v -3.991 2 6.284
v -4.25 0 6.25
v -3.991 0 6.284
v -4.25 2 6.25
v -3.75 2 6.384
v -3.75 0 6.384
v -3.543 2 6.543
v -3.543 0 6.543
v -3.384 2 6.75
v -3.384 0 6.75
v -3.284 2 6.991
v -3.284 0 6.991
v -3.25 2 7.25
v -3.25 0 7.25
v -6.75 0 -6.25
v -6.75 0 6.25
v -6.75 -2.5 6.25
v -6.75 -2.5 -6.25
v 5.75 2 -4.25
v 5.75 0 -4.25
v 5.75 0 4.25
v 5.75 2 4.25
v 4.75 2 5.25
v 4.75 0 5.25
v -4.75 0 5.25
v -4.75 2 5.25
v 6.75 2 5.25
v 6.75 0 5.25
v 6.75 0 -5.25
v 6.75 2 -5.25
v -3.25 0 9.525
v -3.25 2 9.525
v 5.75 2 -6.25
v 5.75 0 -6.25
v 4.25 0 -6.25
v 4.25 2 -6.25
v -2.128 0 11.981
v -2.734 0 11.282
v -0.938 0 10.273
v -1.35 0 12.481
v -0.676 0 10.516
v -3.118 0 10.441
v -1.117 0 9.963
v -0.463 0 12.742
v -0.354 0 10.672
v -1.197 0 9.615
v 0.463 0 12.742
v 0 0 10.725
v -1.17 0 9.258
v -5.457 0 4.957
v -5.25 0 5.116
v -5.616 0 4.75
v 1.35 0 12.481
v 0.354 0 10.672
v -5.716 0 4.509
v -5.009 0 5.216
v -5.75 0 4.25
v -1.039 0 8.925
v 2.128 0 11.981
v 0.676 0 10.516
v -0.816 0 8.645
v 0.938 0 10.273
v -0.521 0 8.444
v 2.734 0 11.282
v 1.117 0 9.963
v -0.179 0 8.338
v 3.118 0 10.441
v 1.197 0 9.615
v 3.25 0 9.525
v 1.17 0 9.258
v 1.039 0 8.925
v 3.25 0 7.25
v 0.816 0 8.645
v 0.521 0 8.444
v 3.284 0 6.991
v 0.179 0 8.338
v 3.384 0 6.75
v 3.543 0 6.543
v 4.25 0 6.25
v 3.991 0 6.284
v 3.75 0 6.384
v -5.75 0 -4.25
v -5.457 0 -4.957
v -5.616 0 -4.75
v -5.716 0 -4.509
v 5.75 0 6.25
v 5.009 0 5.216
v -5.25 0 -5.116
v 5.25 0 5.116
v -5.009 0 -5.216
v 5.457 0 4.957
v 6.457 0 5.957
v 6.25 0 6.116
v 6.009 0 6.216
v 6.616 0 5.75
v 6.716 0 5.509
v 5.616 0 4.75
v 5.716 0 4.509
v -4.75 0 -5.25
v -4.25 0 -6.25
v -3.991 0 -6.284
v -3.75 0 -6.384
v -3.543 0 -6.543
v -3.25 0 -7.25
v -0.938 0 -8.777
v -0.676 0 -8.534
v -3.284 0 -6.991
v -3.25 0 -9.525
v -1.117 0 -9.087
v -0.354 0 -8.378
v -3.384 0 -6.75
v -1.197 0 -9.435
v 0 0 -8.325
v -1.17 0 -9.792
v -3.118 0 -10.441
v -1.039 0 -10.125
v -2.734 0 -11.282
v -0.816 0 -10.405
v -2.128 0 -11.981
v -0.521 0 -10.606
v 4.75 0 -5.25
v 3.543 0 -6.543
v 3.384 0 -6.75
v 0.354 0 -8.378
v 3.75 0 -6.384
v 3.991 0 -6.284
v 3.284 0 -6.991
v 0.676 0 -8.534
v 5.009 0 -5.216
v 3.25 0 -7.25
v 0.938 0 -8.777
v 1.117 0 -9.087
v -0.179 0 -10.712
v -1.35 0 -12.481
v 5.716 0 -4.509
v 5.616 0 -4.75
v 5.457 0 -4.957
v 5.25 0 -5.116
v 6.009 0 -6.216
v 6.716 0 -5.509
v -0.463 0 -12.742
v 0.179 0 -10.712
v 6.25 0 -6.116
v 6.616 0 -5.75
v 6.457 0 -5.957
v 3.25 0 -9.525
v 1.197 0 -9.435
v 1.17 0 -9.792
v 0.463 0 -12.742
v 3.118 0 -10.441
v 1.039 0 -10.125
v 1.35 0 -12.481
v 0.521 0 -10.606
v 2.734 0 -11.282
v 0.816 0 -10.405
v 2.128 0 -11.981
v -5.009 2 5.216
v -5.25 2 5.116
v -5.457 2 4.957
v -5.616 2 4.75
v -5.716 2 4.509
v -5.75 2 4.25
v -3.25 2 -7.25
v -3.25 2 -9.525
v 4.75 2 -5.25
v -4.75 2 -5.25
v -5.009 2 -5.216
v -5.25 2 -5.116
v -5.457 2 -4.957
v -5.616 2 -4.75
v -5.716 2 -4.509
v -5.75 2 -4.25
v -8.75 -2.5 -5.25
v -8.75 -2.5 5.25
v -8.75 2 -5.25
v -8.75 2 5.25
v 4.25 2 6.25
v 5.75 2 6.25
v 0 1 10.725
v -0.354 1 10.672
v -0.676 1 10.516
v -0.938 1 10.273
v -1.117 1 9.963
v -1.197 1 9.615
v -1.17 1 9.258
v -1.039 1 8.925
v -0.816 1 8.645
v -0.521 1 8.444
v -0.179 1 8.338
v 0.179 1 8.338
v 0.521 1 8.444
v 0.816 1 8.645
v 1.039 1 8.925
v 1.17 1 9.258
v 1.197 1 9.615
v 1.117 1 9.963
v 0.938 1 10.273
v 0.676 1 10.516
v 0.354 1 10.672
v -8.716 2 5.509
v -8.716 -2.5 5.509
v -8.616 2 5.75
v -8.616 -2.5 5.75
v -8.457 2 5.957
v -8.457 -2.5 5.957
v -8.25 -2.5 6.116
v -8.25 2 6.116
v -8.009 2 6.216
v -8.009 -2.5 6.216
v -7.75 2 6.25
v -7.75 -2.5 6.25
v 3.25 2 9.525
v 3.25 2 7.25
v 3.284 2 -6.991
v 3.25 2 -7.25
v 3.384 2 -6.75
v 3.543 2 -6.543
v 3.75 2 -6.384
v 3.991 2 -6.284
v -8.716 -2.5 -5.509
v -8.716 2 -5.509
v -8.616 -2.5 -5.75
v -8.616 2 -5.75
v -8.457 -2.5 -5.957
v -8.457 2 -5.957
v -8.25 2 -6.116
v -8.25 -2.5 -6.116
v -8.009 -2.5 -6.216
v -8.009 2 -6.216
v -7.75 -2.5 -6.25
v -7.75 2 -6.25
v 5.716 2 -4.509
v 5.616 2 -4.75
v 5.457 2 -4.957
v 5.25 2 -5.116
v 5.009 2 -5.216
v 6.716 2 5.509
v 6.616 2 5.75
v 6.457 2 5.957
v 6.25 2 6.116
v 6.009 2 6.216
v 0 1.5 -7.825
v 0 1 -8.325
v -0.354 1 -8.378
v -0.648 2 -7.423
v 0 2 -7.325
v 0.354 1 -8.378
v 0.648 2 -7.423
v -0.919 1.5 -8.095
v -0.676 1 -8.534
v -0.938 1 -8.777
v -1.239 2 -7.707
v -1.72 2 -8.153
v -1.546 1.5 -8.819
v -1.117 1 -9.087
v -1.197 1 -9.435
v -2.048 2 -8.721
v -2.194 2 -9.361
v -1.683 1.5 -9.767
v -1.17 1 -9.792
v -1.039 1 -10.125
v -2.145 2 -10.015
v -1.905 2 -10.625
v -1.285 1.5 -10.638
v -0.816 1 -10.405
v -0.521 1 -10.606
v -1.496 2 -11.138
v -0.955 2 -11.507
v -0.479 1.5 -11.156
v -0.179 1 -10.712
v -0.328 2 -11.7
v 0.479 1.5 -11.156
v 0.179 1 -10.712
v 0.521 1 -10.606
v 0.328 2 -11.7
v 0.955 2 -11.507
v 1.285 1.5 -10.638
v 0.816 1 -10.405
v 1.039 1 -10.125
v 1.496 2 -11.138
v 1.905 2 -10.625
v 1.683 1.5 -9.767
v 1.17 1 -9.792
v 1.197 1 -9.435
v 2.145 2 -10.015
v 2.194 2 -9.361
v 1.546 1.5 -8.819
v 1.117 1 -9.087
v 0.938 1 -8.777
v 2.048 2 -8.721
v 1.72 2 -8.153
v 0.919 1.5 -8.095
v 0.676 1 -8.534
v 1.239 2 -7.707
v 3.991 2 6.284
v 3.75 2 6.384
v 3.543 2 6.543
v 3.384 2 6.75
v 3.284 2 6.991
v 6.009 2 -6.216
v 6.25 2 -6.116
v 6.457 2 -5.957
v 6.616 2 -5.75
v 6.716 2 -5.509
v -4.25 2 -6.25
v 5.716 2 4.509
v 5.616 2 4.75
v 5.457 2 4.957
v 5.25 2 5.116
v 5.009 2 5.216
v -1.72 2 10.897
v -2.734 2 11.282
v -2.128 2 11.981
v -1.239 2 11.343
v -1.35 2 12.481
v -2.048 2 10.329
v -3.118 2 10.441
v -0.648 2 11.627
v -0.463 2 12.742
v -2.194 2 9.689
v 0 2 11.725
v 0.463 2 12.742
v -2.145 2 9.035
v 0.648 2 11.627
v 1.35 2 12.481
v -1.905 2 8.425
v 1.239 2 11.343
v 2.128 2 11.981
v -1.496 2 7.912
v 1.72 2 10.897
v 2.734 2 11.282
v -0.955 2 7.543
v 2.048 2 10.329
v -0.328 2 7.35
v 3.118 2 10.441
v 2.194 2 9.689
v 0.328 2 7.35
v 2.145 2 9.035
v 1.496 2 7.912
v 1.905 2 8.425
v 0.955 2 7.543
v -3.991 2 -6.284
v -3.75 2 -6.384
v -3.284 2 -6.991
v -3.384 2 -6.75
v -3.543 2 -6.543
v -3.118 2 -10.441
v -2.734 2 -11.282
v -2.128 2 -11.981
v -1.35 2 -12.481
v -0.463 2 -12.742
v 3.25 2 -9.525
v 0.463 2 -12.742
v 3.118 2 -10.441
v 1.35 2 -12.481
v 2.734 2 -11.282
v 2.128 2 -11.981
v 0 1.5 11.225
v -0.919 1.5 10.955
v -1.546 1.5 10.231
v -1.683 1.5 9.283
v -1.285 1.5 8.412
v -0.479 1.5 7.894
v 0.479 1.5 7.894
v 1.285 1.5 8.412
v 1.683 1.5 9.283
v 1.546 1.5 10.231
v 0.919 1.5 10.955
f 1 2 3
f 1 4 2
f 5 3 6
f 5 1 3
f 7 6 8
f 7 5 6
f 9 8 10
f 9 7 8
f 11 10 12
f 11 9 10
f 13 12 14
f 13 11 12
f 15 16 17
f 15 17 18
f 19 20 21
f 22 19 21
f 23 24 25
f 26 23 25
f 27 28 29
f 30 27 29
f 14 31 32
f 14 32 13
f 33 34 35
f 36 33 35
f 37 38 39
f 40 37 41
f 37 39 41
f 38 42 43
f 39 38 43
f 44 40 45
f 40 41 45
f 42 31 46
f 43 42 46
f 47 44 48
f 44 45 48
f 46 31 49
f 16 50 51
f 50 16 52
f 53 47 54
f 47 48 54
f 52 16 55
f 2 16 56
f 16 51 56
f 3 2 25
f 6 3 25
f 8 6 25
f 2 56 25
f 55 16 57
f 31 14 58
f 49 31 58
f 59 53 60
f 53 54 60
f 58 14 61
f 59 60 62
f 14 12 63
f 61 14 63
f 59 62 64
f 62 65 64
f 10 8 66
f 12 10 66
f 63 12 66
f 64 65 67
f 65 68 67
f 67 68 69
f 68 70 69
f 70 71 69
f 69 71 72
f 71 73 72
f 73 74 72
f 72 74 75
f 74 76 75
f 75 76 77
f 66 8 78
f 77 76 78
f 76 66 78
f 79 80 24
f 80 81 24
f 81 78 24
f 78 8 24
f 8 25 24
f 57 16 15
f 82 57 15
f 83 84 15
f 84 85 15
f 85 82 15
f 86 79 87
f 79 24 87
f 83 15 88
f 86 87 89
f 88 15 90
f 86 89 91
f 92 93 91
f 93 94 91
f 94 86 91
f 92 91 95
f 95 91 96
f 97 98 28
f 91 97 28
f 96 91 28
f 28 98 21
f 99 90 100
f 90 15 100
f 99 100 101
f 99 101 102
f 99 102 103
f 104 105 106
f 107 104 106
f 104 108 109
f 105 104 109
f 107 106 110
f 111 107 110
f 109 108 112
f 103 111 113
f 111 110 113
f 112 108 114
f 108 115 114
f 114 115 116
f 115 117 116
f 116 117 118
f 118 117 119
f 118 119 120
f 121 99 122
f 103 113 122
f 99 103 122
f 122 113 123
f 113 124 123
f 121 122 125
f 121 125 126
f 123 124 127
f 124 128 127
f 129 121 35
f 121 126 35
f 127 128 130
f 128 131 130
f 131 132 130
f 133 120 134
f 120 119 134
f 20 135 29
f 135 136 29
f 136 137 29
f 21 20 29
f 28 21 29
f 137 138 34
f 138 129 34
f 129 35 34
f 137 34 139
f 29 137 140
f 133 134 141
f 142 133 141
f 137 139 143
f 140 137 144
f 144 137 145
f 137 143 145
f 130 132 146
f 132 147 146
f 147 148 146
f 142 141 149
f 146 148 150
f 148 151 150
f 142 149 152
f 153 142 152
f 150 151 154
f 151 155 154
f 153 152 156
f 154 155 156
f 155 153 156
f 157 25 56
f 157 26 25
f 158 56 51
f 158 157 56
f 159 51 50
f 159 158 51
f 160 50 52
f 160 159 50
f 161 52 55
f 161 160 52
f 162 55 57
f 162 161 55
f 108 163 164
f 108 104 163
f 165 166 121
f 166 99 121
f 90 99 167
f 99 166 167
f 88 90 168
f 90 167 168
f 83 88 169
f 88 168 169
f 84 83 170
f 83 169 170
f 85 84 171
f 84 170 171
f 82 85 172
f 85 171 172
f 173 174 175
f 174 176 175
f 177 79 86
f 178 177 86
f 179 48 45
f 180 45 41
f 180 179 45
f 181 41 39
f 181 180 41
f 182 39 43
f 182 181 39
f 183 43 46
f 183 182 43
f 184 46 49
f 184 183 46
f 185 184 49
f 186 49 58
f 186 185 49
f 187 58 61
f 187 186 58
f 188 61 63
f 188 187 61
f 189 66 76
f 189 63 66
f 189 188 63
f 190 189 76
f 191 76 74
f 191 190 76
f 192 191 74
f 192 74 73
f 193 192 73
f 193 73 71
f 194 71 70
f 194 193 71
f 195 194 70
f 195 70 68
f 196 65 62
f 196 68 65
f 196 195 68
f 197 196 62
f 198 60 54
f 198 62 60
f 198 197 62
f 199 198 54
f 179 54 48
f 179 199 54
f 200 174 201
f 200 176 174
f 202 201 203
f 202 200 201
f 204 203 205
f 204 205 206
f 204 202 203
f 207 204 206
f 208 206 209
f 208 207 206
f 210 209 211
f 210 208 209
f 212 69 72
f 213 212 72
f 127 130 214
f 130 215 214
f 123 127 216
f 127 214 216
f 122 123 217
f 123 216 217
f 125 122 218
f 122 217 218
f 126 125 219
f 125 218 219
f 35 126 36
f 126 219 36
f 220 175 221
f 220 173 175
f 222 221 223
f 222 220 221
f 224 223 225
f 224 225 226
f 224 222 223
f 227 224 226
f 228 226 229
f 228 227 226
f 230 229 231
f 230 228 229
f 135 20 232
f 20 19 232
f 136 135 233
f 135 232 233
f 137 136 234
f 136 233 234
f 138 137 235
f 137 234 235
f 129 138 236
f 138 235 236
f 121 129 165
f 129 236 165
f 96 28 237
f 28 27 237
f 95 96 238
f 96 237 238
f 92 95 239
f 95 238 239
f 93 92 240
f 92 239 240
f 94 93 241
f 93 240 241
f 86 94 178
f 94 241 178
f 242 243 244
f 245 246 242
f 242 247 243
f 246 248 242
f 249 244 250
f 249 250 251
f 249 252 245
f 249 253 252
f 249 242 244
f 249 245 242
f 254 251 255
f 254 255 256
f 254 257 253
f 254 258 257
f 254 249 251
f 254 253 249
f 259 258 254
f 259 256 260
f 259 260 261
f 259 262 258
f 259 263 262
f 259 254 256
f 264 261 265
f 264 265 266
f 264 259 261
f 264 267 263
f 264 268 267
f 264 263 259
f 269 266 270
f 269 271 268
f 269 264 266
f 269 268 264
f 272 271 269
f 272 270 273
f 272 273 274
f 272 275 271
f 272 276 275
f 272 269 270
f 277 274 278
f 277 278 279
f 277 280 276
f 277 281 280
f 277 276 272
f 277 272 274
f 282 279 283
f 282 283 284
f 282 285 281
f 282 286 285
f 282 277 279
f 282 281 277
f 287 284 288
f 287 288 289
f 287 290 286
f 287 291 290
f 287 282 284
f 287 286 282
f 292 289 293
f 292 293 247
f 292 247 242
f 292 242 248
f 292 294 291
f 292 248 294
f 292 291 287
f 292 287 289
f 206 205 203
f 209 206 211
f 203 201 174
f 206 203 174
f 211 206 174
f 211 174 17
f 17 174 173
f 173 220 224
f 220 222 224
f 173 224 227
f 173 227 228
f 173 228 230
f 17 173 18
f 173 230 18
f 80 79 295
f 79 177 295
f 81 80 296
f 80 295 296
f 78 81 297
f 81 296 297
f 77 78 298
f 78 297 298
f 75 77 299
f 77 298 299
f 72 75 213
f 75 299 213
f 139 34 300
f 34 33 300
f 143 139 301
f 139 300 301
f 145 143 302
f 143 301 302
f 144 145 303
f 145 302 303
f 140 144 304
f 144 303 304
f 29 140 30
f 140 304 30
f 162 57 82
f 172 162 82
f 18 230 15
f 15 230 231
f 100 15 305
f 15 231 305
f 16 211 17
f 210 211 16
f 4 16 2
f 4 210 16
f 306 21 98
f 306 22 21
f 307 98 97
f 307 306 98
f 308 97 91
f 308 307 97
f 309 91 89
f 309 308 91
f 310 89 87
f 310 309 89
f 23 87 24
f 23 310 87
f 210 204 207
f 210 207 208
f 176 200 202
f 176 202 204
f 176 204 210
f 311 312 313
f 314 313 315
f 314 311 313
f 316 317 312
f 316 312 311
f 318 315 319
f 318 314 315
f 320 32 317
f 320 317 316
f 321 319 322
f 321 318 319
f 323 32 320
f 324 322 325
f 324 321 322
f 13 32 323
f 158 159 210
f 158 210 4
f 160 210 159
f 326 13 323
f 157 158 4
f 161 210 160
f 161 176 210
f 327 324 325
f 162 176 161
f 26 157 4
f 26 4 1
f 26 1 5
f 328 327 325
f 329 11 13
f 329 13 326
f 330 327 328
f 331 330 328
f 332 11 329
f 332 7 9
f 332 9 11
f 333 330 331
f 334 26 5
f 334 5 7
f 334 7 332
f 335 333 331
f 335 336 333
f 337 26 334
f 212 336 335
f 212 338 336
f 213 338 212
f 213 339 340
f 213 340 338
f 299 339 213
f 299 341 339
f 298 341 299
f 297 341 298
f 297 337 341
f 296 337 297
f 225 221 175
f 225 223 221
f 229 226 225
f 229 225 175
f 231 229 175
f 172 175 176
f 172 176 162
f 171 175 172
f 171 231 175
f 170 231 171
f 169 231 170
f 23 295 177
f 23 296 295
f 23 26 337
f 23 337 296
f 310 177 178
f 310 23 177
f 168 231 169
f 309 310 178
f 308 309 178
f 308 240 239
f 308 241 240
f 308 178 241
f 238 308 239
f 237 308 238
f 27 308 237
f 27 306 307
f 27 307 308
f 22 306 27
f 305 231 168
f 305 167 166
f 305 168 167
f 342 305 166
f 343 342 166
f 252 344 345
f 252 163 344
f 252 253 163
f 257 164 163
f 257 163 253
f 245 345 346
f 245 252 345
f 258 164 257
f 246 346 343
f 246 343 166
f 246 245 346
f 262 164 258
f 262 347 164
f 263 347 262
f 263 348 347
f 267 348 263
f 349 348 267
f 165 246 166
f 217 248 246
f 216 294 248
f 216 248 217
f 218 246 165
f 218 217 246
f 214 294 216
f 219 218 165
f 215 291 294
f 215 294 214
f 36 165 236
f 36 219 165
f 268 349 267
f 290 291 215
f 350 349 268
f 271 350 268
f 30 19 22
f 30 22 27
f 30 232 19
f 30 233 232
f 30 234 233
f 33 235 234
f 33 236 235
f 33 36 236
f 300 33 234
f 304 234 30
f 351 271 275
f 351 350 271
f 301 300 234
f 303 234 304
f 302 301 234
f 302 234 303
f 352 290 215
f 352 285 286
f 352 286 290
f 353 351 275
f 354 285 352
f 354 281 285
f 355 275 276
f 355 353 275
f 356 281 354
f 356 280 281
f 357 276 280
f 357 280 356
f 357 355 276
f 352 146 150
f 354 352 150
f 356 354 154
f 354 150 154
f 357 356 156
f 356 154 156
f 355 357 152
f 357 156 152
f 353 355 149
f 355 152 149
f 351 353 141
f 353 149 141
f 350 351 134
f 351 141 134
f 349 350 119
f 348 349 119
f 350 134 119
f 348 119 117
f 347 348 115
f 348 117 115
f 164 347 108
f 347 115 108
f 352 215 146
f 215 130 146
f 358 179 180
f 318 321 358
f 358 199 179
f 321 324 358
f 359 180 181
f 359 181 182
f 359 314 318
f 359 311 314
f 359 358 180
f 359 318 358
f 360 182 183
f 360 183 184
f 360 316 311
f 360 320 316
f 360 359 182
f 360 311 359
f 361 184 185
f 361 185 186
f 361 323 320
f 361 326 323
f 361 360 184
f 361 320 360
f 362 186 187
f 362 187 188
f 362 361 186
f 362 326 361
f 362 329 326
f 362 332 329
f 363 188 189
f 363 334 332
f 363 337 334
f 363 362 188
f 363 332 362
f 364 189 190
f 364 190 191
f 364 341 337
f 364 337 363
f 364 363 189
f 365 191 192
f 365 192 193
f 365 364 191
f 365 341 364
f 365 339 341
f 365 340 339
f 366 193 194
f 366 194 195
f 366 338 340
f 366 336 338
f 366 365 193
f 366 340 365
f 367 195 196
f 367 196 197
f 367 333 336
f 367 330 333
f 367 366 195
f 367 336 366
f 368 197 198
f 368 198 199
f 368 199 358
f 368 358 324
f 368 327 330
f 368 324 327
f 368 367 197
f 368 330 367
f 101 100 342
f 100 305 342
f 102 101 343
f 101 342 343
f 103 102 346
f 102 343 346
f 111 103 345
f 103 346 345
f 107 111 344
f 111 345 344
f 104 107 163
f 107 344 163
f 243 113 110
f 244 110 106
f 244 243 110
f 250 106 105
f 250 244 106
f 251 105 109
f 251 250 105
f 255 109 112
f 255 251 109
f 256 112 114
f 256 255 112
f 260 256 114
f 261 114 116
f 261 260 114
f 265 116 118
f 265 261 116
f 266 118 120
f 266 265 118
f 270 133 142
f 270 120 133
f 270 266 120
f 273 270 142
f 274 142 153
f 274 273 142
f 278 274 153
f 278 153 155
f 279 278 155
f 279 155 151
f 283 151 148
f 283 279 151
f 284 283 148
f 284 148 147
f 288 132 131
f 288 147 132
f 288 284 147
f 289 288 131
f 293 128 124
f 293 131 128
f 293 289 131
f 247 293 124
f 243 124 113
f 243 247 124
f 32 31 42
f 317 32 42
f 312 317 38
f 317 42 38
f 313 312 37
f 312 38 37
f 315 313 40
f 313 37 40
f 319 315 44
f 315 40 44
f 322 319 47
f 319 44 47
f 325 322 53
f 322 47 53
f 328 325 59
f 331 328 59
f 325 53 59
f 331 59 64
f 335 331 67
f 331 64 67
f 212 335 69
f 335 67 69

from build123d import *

# Parameters (mm, degrees)
SKETCH1_W                                      = 11.5
SKETCH1_H                                      = 10.5
BOSS_EXTRUDE1_DEPTH                            = 2
SKETCH1_4_W                                    = 2
SKETCH1_4_H                                    = 12.5
BOSS_EXTRUDE2_DEPTH                            = 2.5
CSK_FOR_M2_FLAT_HEAD_MACHINE_SCREW2_AT_2_COUNT = 2
CSK_FOR_M2_FLAT_HEAD_MACHINE_SCREW2_AT_2_PITCH = 19.05
CSK_FOR_M2_FLAT_HEAD_MACHINE_SCREW2_AT_3_COUNT = 2
CSK_FOR_M2_FLAT_HEAD_MACHINE_SCREW2_AT_3_PITCH = 19.05
FILLET1_R                                      = 1


with BuildPart() as part:
    # Sketch1 → Boss-Extrude1 (new body)
    with BuildSketch(Plane(origin=(0, 0, 0), x_dir=(1, 0, 0), z_dir=(0, 1, 0))):
        with BuildLine():
            ThreePointArc((3.25, 9.525), (0, 12.775), (-3.25, 9.525))
            Line((-3.25, 9.525), (-3.25, 6.25))
            Line((-3.25, 6.25), (-8.75, 6.25))
            Line((-8.75, 6.25), (-8.75, -6.25))
            Line((-8.75, -6.25), (-3.25, -6.25))
            Line((-3.25, -6.25), (-3.25, -9.525))
            ThreePointArc((-3.25, -9.525), (0, -12.775), (3.25, -9.525))
            Line((3.25, -9.525), (3.25, -6.25))
            Line((3.25, -6.25), (6.75, -6.25))
            Line((6.75, -6.25), (6.75, 6.25))
            Line((6.75, 6.25), (3.25, 6.25))
            Line((3.25, 6.25), (3.25, 9.525))
        make_face()
        Rectangle(SKETCH1_W, SKETCH1_H, mode=Mode.SUBTRACT)
    extrude(amount=BOSS_EXTRUDE1_DEPTH)

    # Sketch1<4> → Boss-Extrude2 (add)
    with BuildSketch(Plane(origin=(0, 0, 0), x_dir=(1, 0, 0), z_dir=(0, 1, 0))):
        with Locations((-7.75, 0)):
            Rectangle(SKETCH1_4_W, SKETCH1_4_H)
    extrude(amount=-BOSS_EXTRUDE2_DEPTH)

    # Sketch3 → CSK for M2 Flat Head Machine Screw2 (revolve, cut)
    with BuildSketch(Plane(origin=(0, 2, -9.525), x_dir=(0, 0, 1), z_dir=(1, 0, 0))):
        Polygon((0, 0), (0, 4.5), (1.2, 4.5), (1.2, 1), (2.2, 0), align=None)
    csk_for_m2_flat_head_machine_screw2 = revolve(axis=Axis((0, 8.35, -9.525), (0, -1, 0)), mode=Mode.SUBTRACT)

    # CSK for M2 Flat Head Machine Screw2 at 2: CSK for M2 Flat Head Machine Screw2 ×2
    with Locations(*[(0, 0, i * CSK_FOR_M2_FLAT_HEAD_MACHINE_SCREW2_AT_2_PITCH) for i in range(1, CSK_FOR_M2_FLAT_HEAD_MACHINE_SCREW2_AT_2_COUNT)]):
        add(csk_for_m2_flat_head_machine_screw2, mode=Mode.SUBTRACT)

    # CSK for M2 Flat Head Machine Screw2 at 3: CSK for M2 Flat Head Machine Screw2 ×2
    with Locations(*[(0, 0, i * CSK_FOR_M2_FLAT_HEAD_MACHINE_SCREW2_AT_3_PITCH) for i in range(1, CSK_FOR_M2_FLAT_HEAD_MACHINE_SCREW2_AT_3_COUNT)]):
        add(csk_for_m2_flat_head_machine_screw2, mode=Mode.SUBTRACT)

    # Fillet1
    fillet1_edges = [part.edges().sort_by_distance(p)[0] for p in [
        (-8.75, -0.25, 6.25),
        (-8.75, -0.25, -6.25),
        (-3.25, 1, -6.25),
        (3.25, 1, -6.25),
        (3.25, 1, 6.25),
        (-3.25, 1, 6.25),
        (6.75, 1, 6.25),
        (6.75, 1, -6.25),
        (5.75, 1, -5.25),
        (-5.75, 1, -5.25),
        (5.75, 1, 5.25),
        (-5.75, 1, 5.25),
    ]]
    fillet(fillet1_edges, radius=FILLET1_R)


solid = part.part
